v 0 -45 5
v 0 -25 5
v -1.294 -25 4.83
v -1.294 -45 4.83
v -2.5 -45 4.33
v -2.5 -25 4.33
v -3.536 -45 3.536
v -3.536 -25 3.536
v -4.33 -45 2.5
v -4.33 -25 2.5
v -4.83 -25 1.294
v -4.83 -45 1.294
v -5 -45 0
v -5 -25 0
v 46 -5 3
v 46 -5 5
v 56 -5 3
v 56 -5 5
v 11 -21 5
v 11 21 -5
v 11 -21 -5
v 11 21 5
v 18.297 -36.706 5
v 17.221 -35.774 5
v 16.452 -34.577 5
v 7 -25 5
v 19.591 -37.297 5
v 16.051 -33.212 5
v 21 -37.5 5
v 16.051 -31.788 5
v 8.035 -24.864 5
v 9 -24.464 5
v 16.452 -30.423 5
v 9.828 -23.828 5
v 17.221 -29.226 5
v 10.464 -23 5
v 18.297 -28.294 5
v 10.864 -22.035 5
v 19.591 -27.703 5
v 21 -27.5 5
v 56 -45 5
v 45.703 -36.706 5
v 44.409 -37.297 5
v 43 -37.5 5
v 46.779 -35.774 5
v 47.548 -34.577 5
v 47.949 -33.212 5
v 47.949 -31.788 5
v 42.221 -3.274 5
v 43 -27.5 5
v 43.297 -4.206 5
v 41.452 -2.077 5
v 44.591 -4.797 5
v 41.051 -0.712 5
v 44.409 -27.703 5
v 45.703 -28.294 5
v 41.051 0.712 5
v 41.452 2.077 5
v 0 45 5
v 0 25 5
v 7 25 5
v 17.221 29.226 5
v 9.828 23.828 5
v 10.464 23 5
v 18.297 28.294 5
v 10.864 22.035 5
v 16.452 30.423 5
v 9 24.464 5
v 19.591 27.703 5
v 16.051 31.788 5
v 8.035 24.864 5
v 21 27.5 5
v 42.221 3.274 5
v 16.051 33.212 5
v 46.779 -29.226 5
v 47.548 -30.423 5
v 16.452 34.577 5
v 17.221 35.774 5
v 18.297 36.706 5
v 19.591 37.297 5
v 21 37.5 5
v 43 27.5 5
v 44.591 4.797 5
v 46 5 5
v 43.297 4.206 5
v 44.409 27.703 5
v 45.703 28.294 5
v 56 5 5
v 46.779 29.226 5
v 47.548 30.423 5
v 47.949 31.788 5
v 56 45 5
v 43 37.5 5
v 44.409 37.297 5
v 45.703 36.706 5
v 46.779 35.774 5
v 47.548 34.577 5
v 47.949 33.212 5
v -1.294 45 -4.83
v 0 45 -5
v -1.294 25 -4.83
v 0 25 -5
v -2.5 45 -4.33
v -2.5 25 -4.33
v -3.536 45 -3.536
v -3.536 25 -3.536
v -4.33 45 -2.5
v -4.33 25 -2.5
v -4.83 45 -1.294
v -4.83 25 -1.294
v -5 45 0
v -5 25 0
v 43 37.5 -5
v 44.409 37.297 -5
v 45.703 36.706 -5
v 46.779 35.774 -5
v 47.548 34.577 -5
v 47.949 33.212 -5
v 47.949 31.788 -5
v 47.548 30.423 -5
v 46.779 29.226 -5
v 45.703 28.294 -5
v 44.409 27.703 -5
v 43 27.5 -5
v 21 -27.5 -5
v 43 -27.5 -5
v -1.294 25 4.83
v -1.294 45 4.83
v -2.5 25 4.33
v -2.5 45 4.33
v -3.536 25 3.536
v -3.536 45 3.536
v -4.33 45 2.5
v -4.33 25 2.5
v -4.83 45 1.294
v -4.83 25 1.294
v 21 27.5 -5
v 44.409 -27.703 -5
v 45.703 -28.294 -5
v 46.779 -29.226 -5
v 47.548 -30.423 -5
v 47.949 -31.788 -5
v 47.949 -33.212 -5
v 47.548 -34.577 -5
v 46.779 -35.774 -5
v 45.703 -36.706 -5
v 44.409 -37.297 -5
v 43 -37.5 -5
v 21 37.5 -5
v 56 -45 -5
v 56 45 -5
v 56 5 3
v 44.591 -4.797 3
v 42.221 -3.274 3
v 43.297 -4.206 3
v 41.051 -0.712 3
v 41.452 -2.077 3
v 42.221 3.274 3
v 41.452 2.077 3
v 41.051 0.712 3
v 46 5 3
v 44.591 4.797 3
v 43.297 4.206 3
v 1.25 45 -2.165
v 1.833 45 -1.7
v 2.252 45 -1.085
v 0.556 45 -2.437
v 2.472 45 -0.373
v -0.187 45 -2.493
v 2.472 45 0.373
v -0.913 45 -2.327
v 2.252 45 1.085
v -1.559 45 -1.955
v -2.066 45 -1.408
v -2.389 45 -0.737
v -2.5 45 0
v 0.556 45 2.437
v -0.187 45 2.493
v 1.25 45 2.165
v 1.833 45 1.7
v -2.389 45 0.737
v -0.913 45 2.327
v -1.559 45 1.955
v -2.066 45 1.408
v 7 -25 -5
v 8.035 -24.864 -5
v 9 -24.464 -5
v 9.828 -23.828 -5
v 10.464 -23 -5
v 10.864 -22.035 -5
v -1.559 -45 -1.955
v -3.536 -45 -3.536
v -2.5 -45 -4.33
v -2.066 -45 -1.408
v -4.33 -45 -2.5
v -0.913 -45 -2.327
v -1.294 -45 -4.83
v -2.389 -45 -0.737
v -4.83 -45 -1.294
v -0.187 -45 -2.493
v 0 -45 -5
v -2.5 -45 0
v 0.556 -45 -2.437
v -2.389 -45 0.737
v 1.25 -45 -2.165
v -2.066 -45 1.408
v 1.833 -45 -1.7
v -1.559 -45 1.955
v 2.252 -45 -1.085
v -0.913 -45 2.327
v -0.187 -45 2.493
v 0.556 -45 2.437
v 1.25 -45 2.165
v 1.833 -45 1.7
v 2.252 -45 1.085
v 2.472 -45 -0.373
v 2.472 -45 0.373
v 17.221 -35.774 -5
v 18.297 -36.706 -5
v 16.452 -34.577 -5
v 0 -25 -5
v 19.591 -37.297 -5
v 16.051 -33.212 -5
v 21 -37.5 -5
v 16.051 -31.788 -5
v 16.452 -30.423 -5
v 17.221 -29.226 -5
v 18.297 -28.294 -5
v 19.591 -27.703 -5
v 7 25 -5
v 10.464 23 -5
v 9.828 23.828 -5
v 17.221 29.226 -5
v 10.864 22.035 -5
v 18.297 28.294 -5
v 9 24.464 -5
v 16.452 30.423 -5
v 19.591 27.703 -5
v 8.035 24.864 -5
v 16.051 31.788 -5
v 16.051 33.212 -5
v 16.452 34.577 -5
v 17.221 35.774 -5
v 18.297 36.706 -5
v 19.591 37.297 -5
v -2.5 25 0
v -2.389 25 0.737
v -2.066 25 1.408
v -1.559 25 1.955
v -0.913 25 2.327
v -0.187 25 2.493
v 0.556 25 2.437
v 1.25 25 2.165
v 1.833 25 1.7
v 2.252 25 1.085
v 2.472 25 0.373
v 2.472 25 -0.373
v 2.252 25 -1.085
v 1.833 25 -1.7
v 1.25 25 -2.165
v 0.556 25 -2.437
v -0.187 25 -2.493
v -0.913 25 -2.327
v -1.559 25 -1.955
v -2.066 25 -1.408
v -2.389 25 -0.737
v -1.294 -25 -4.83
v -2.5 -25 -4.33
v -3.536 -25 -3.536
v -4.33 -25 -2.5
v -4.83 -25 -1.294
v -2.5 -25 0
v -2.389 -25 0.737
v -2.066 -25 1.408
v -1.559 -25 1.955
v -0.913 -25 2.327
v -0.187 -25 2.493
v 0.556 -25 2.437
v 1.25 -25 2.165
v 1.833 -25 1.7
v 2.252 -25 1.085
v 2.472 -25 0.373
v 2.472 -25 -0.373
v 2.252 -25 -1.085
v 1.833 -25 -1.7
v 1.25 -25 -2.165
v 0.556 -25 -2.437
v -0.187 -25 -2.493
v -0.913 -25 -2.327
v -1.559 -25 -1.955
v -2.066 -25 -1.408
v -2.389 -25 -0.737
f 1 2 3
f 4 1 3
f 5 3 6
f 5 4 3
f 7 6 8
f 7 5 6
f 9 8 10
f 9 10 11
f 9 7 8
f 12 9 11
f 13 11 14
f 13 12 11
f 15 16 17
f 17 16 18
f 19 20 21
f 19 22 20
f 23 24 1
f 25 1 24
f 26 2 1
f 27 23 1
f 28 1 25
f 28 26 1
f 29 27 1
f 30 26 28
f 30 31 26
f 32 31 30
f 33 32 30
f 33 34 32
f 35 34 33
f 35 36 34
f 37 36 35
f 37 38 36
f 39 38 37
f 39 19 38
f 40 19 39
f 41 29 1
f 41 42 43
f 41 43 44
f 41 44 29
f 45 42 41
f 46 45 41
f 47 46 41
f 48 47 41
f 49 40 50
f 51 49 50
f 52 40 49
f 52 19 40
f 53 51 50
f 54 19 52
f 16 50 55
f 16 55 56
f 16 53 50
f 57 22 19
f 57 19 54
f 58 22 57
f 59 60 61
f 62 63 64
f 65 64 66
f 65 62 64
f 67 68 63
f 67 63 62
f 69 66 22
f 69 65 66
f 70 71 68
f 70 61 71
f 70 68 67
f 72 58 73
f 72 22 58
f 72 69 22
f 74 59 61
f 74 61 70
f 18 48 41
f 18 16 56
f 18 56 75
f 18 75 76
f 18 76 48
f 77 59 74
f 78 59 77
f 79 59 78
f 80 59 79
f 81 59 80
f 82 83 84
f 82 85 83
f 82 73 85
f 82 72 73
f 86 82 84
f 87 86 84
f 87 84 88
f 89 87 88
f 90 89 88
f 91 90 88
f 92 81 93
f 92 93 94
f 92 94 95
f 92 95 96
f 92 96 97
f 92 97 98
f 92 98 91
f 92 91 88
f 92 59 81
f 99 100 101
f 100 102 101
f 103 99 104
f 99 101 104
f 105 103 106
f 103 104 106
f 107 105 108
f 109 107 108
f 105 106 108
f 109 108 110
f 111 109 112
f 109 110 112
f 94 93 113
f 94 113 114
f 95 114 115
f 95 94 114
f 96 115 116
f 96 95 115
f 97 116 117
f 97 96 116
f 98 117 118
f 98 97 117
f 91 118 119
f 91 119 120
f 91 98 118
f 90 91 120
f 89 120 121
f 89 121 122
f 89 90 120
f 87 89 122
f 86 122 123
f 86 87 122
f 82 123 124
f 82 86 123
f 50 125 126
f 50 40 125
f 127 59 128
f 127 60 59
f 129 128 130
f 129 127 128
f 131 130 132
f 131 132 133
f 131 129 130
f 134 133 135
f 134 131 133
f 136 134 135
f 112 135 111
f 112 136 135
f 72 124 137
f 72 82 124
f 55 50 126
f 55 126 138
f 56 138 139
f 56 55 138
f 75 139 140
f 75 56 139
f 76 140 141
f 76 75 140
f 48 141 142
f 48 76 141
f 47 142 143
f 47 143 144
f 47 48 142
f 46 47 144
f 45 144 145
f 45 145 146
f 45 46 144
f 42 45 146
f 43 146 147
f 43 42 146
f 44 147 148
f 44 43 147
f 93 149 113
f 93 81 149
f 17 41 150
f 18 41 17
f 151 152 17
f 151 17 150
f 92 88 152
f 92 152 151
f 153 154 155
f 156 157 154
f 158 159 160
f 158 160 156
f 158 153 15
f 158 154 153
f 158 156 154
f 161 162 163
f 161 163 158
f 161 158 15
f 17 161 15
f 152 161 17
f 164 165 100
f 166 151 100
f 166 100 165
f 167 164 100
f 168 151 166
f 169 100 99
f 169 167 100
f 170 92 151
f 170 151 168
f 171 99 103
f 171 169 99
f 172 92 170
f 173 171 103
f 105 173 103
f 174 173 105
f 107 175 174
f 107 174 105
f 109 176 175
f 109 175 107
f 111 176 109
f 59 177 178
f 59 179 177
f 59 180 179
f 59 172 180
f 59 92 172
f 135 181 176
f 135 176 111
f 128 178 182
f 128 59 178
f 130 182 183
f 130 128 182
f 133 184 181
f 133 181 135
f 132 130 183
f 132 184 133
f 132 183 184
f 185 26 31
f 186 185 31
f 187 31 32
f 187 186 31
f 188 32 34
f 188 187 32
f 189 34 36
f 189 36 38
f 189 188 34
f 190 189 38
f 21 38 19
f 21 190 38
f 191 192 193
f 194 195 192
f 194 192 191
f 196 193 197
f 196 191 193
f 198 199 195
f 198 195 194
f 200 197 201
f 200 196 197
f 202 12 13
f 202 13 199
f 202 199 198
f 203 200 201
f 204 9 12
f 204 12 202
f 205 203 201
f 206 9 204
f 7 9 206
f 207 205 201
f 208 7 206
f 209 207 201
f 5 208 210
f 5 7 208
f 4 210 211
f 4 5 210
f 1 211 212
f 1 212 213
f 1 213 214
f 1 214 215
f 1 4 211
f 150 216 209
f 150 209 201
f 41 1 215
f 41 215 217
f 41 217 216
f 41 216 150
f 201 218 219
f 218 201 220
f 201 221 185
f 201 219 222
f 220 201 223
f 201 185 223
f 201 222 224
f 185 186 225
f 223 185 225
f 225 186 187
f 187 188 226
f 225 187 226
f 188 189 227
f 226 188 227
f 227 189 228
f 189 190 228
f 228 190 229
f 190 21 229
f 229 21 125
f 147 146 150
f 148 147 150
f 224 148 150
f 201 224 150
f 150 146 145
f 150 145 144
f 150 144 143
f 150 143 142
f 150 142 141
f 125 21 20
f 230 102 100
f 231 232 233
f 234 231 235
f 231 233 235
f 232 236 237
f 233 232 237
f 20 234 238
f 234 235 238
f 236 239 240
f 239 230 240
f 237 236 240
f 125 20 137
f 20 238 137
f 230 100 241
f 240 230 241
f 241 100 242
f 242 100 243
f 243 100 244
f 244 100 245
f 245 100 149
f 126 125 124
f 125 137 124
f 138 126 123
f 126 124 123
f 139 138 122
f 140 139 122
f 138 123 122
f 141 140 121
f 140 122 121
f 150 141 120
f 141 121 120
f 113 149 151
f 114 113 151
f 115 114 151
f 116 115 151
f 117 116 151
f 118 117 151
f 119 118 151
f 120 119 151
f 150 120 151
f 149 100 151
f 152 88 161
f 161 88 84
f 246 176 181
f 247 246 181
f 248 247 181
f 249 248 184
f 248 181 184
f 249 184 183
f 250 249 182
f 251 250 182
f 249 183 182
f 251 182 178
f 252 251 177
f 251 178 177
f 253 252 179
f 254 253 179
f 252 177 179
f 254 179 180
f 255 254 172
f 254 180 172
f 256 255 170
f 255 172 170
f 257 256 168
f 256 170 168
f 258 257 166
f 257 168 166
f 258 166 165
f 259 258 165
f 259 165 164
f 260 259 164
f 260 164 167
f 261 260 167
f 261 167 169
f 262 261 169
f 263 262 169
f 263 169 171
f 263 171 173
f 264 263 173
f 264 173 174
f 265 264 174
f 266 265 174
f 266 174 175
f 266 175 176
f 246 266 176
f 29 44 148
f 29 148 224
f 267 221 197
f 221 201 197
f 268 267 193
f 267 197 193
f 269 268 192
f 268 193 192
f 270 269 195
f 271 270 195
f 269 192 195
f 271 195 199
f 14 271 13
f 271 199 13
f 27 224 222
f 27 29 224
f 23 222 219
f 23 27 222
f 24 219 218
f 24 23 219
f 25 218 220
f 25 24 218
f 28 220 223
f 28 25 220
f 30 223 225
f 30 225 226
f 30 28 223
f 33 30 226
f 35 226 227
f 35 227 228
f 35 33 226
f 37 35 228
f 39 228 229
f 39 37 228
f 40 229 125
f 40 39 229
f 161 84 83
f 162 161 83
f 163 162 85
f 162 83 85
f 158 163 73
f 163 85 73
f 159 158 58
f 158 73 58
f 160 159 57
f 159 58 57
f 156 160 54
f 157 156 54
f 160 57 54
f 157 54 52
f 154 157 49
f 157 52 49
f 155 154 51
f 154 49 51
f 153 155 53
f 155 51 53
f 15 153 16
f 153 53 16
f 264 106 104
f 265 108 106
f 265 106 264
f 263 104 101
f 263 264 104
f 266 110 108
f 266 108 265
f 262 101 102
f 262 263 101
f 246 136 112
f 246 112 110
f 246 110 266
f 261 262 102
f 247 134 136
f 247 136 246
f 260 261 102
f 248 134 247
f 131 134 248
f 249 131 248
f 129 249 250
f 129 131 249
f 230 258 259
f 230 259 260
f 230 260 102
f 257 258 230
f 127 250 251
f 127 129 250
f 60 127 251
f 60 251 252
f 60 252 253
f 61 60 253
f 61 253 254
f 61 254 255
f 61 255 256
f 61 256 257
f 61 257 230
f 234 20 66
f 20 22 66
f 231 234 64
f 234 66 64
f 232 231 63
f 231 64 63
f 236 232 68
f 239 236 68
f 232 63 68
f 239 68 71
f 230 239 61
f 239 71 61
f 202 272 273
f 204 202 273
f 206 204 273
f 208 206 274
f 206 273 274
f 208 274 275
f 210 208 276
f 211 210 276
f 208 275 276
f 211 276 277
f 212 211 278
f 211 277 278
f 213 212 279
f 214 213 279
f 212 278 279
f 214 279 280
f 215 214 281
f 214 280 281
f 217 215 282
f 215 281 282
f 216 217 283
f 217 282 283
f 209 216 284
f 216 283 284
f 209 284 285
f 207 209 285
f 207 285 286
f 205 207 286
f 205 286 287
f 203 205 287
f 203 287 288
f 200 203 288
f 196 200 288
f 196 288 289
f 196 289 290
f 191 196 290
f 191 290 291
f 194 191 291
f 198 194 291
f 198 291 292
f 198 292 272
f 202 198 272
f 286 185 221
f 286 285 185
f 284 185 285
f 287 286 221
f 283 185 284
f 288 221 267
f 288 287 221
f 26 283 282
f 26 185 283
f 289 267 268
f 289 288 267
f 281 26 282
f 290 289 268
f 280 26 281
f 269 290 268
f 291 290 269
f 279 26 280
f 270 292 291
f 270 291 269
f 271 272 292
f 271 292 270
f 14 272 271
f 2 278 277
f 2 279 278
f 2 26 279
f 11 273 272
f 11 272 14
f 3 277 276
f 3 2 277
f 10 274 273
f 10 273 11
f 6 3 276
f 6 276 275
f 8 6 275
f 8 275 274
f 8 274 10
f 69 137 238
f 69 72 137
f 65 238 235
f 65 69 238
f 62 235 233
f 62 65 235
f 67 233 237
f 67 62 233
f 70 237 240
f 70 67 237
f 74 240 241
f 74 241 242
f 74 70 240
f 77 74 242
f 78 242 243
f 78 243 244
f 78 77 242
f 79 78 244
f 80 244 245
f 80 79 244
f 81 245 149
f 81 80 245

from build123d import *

# Parameters (mm, degrees)
F1_DEPTH = 5
F3_D     = 5
F4_R     = 4.99999
F5_R     = 4
F7_DEPTH = 2


# Not quite as in the source:
# - a fillet or chamfer is up to 0.001 mm smaller than in the source, because OpenCascade refuses the exact size
# - a feature names something its author has since deleted; it is built from what else it names


with BuildPart() as f1:
    # F0 (on Top) → F1 (new body, symmetric)
    with BuildSketch(Plane.XY):
        Polygon((13, -45), (56, -45), (56, 45), (13, 45), (-5, 45), (-5, 25), (11, 25), (11, -25), (-5, -25), (-5, -45), align=None)
        with BuildLine():
            ThreePointArc((43, -27.5), (48, -32.5), (43, -37.5))
            Line((43, -37.5), (21, -37.5))
            ThreePointArc((21, -37.5), (16, -32.5), (21, -27.5))
            Line((21, -27.5), (43, -27.5))
        make_face(mode=Mode.SUBTRACT)
        with BuildLine():
            ThreePointArc((43, 37.5), (48, 32.5), (43, 27.5))
            Line((43, 27.5), (21, 27.5))
            ThreePointArc((21, 27.5), (16, 32.5), (21, 37.5))
            Line((21, 37.5), (43, 37.5))
        make_face(mode=Mode.SUBTRACT)
    extrude(amount=F1_DEPTH, both=True)

    # F3 (through all)
    with Locations(Plane.XZ.offset(45)):
        with Locations((0, 0)):
            Hole(F3_D / 2)

    # F4 (radius 5 in the source; OpenCascade refuses exactly that, so slightly less here)
    f4_edges = [f1.edges().sort_by_distance(p)[0] for p in [
        (-5, -35, 5),
        (-5, -35, -5),
        (-5, 35, 5),
        (-5, 35, -5),
    ]]
    fillet(f4_edges, radius=F4_R)

    # F5
    f5_edges = [f1.edges().sort_by_distance(p)[0] for p in [
        (11, 25, 0),
        (11, -25, 0),
    ]]
    fillet(f5_edges, radius=F5_R)

    # F6 (on face) → F7 (cut)
    with BuildSketch(Plane.XY.offset(5)):
        with BuildLine():
            ThreePointArc((46, 5), (41, 0), (46, -5))
            Line((46, -5), (56, -5))
            Line((56, -5), (56, 5))
            Line((56, 5), (46, 5))
        make_face()
    extrude(amount=-F7_DEPTH, mode=Mode.SUBTRACT)


solid = f1.part
